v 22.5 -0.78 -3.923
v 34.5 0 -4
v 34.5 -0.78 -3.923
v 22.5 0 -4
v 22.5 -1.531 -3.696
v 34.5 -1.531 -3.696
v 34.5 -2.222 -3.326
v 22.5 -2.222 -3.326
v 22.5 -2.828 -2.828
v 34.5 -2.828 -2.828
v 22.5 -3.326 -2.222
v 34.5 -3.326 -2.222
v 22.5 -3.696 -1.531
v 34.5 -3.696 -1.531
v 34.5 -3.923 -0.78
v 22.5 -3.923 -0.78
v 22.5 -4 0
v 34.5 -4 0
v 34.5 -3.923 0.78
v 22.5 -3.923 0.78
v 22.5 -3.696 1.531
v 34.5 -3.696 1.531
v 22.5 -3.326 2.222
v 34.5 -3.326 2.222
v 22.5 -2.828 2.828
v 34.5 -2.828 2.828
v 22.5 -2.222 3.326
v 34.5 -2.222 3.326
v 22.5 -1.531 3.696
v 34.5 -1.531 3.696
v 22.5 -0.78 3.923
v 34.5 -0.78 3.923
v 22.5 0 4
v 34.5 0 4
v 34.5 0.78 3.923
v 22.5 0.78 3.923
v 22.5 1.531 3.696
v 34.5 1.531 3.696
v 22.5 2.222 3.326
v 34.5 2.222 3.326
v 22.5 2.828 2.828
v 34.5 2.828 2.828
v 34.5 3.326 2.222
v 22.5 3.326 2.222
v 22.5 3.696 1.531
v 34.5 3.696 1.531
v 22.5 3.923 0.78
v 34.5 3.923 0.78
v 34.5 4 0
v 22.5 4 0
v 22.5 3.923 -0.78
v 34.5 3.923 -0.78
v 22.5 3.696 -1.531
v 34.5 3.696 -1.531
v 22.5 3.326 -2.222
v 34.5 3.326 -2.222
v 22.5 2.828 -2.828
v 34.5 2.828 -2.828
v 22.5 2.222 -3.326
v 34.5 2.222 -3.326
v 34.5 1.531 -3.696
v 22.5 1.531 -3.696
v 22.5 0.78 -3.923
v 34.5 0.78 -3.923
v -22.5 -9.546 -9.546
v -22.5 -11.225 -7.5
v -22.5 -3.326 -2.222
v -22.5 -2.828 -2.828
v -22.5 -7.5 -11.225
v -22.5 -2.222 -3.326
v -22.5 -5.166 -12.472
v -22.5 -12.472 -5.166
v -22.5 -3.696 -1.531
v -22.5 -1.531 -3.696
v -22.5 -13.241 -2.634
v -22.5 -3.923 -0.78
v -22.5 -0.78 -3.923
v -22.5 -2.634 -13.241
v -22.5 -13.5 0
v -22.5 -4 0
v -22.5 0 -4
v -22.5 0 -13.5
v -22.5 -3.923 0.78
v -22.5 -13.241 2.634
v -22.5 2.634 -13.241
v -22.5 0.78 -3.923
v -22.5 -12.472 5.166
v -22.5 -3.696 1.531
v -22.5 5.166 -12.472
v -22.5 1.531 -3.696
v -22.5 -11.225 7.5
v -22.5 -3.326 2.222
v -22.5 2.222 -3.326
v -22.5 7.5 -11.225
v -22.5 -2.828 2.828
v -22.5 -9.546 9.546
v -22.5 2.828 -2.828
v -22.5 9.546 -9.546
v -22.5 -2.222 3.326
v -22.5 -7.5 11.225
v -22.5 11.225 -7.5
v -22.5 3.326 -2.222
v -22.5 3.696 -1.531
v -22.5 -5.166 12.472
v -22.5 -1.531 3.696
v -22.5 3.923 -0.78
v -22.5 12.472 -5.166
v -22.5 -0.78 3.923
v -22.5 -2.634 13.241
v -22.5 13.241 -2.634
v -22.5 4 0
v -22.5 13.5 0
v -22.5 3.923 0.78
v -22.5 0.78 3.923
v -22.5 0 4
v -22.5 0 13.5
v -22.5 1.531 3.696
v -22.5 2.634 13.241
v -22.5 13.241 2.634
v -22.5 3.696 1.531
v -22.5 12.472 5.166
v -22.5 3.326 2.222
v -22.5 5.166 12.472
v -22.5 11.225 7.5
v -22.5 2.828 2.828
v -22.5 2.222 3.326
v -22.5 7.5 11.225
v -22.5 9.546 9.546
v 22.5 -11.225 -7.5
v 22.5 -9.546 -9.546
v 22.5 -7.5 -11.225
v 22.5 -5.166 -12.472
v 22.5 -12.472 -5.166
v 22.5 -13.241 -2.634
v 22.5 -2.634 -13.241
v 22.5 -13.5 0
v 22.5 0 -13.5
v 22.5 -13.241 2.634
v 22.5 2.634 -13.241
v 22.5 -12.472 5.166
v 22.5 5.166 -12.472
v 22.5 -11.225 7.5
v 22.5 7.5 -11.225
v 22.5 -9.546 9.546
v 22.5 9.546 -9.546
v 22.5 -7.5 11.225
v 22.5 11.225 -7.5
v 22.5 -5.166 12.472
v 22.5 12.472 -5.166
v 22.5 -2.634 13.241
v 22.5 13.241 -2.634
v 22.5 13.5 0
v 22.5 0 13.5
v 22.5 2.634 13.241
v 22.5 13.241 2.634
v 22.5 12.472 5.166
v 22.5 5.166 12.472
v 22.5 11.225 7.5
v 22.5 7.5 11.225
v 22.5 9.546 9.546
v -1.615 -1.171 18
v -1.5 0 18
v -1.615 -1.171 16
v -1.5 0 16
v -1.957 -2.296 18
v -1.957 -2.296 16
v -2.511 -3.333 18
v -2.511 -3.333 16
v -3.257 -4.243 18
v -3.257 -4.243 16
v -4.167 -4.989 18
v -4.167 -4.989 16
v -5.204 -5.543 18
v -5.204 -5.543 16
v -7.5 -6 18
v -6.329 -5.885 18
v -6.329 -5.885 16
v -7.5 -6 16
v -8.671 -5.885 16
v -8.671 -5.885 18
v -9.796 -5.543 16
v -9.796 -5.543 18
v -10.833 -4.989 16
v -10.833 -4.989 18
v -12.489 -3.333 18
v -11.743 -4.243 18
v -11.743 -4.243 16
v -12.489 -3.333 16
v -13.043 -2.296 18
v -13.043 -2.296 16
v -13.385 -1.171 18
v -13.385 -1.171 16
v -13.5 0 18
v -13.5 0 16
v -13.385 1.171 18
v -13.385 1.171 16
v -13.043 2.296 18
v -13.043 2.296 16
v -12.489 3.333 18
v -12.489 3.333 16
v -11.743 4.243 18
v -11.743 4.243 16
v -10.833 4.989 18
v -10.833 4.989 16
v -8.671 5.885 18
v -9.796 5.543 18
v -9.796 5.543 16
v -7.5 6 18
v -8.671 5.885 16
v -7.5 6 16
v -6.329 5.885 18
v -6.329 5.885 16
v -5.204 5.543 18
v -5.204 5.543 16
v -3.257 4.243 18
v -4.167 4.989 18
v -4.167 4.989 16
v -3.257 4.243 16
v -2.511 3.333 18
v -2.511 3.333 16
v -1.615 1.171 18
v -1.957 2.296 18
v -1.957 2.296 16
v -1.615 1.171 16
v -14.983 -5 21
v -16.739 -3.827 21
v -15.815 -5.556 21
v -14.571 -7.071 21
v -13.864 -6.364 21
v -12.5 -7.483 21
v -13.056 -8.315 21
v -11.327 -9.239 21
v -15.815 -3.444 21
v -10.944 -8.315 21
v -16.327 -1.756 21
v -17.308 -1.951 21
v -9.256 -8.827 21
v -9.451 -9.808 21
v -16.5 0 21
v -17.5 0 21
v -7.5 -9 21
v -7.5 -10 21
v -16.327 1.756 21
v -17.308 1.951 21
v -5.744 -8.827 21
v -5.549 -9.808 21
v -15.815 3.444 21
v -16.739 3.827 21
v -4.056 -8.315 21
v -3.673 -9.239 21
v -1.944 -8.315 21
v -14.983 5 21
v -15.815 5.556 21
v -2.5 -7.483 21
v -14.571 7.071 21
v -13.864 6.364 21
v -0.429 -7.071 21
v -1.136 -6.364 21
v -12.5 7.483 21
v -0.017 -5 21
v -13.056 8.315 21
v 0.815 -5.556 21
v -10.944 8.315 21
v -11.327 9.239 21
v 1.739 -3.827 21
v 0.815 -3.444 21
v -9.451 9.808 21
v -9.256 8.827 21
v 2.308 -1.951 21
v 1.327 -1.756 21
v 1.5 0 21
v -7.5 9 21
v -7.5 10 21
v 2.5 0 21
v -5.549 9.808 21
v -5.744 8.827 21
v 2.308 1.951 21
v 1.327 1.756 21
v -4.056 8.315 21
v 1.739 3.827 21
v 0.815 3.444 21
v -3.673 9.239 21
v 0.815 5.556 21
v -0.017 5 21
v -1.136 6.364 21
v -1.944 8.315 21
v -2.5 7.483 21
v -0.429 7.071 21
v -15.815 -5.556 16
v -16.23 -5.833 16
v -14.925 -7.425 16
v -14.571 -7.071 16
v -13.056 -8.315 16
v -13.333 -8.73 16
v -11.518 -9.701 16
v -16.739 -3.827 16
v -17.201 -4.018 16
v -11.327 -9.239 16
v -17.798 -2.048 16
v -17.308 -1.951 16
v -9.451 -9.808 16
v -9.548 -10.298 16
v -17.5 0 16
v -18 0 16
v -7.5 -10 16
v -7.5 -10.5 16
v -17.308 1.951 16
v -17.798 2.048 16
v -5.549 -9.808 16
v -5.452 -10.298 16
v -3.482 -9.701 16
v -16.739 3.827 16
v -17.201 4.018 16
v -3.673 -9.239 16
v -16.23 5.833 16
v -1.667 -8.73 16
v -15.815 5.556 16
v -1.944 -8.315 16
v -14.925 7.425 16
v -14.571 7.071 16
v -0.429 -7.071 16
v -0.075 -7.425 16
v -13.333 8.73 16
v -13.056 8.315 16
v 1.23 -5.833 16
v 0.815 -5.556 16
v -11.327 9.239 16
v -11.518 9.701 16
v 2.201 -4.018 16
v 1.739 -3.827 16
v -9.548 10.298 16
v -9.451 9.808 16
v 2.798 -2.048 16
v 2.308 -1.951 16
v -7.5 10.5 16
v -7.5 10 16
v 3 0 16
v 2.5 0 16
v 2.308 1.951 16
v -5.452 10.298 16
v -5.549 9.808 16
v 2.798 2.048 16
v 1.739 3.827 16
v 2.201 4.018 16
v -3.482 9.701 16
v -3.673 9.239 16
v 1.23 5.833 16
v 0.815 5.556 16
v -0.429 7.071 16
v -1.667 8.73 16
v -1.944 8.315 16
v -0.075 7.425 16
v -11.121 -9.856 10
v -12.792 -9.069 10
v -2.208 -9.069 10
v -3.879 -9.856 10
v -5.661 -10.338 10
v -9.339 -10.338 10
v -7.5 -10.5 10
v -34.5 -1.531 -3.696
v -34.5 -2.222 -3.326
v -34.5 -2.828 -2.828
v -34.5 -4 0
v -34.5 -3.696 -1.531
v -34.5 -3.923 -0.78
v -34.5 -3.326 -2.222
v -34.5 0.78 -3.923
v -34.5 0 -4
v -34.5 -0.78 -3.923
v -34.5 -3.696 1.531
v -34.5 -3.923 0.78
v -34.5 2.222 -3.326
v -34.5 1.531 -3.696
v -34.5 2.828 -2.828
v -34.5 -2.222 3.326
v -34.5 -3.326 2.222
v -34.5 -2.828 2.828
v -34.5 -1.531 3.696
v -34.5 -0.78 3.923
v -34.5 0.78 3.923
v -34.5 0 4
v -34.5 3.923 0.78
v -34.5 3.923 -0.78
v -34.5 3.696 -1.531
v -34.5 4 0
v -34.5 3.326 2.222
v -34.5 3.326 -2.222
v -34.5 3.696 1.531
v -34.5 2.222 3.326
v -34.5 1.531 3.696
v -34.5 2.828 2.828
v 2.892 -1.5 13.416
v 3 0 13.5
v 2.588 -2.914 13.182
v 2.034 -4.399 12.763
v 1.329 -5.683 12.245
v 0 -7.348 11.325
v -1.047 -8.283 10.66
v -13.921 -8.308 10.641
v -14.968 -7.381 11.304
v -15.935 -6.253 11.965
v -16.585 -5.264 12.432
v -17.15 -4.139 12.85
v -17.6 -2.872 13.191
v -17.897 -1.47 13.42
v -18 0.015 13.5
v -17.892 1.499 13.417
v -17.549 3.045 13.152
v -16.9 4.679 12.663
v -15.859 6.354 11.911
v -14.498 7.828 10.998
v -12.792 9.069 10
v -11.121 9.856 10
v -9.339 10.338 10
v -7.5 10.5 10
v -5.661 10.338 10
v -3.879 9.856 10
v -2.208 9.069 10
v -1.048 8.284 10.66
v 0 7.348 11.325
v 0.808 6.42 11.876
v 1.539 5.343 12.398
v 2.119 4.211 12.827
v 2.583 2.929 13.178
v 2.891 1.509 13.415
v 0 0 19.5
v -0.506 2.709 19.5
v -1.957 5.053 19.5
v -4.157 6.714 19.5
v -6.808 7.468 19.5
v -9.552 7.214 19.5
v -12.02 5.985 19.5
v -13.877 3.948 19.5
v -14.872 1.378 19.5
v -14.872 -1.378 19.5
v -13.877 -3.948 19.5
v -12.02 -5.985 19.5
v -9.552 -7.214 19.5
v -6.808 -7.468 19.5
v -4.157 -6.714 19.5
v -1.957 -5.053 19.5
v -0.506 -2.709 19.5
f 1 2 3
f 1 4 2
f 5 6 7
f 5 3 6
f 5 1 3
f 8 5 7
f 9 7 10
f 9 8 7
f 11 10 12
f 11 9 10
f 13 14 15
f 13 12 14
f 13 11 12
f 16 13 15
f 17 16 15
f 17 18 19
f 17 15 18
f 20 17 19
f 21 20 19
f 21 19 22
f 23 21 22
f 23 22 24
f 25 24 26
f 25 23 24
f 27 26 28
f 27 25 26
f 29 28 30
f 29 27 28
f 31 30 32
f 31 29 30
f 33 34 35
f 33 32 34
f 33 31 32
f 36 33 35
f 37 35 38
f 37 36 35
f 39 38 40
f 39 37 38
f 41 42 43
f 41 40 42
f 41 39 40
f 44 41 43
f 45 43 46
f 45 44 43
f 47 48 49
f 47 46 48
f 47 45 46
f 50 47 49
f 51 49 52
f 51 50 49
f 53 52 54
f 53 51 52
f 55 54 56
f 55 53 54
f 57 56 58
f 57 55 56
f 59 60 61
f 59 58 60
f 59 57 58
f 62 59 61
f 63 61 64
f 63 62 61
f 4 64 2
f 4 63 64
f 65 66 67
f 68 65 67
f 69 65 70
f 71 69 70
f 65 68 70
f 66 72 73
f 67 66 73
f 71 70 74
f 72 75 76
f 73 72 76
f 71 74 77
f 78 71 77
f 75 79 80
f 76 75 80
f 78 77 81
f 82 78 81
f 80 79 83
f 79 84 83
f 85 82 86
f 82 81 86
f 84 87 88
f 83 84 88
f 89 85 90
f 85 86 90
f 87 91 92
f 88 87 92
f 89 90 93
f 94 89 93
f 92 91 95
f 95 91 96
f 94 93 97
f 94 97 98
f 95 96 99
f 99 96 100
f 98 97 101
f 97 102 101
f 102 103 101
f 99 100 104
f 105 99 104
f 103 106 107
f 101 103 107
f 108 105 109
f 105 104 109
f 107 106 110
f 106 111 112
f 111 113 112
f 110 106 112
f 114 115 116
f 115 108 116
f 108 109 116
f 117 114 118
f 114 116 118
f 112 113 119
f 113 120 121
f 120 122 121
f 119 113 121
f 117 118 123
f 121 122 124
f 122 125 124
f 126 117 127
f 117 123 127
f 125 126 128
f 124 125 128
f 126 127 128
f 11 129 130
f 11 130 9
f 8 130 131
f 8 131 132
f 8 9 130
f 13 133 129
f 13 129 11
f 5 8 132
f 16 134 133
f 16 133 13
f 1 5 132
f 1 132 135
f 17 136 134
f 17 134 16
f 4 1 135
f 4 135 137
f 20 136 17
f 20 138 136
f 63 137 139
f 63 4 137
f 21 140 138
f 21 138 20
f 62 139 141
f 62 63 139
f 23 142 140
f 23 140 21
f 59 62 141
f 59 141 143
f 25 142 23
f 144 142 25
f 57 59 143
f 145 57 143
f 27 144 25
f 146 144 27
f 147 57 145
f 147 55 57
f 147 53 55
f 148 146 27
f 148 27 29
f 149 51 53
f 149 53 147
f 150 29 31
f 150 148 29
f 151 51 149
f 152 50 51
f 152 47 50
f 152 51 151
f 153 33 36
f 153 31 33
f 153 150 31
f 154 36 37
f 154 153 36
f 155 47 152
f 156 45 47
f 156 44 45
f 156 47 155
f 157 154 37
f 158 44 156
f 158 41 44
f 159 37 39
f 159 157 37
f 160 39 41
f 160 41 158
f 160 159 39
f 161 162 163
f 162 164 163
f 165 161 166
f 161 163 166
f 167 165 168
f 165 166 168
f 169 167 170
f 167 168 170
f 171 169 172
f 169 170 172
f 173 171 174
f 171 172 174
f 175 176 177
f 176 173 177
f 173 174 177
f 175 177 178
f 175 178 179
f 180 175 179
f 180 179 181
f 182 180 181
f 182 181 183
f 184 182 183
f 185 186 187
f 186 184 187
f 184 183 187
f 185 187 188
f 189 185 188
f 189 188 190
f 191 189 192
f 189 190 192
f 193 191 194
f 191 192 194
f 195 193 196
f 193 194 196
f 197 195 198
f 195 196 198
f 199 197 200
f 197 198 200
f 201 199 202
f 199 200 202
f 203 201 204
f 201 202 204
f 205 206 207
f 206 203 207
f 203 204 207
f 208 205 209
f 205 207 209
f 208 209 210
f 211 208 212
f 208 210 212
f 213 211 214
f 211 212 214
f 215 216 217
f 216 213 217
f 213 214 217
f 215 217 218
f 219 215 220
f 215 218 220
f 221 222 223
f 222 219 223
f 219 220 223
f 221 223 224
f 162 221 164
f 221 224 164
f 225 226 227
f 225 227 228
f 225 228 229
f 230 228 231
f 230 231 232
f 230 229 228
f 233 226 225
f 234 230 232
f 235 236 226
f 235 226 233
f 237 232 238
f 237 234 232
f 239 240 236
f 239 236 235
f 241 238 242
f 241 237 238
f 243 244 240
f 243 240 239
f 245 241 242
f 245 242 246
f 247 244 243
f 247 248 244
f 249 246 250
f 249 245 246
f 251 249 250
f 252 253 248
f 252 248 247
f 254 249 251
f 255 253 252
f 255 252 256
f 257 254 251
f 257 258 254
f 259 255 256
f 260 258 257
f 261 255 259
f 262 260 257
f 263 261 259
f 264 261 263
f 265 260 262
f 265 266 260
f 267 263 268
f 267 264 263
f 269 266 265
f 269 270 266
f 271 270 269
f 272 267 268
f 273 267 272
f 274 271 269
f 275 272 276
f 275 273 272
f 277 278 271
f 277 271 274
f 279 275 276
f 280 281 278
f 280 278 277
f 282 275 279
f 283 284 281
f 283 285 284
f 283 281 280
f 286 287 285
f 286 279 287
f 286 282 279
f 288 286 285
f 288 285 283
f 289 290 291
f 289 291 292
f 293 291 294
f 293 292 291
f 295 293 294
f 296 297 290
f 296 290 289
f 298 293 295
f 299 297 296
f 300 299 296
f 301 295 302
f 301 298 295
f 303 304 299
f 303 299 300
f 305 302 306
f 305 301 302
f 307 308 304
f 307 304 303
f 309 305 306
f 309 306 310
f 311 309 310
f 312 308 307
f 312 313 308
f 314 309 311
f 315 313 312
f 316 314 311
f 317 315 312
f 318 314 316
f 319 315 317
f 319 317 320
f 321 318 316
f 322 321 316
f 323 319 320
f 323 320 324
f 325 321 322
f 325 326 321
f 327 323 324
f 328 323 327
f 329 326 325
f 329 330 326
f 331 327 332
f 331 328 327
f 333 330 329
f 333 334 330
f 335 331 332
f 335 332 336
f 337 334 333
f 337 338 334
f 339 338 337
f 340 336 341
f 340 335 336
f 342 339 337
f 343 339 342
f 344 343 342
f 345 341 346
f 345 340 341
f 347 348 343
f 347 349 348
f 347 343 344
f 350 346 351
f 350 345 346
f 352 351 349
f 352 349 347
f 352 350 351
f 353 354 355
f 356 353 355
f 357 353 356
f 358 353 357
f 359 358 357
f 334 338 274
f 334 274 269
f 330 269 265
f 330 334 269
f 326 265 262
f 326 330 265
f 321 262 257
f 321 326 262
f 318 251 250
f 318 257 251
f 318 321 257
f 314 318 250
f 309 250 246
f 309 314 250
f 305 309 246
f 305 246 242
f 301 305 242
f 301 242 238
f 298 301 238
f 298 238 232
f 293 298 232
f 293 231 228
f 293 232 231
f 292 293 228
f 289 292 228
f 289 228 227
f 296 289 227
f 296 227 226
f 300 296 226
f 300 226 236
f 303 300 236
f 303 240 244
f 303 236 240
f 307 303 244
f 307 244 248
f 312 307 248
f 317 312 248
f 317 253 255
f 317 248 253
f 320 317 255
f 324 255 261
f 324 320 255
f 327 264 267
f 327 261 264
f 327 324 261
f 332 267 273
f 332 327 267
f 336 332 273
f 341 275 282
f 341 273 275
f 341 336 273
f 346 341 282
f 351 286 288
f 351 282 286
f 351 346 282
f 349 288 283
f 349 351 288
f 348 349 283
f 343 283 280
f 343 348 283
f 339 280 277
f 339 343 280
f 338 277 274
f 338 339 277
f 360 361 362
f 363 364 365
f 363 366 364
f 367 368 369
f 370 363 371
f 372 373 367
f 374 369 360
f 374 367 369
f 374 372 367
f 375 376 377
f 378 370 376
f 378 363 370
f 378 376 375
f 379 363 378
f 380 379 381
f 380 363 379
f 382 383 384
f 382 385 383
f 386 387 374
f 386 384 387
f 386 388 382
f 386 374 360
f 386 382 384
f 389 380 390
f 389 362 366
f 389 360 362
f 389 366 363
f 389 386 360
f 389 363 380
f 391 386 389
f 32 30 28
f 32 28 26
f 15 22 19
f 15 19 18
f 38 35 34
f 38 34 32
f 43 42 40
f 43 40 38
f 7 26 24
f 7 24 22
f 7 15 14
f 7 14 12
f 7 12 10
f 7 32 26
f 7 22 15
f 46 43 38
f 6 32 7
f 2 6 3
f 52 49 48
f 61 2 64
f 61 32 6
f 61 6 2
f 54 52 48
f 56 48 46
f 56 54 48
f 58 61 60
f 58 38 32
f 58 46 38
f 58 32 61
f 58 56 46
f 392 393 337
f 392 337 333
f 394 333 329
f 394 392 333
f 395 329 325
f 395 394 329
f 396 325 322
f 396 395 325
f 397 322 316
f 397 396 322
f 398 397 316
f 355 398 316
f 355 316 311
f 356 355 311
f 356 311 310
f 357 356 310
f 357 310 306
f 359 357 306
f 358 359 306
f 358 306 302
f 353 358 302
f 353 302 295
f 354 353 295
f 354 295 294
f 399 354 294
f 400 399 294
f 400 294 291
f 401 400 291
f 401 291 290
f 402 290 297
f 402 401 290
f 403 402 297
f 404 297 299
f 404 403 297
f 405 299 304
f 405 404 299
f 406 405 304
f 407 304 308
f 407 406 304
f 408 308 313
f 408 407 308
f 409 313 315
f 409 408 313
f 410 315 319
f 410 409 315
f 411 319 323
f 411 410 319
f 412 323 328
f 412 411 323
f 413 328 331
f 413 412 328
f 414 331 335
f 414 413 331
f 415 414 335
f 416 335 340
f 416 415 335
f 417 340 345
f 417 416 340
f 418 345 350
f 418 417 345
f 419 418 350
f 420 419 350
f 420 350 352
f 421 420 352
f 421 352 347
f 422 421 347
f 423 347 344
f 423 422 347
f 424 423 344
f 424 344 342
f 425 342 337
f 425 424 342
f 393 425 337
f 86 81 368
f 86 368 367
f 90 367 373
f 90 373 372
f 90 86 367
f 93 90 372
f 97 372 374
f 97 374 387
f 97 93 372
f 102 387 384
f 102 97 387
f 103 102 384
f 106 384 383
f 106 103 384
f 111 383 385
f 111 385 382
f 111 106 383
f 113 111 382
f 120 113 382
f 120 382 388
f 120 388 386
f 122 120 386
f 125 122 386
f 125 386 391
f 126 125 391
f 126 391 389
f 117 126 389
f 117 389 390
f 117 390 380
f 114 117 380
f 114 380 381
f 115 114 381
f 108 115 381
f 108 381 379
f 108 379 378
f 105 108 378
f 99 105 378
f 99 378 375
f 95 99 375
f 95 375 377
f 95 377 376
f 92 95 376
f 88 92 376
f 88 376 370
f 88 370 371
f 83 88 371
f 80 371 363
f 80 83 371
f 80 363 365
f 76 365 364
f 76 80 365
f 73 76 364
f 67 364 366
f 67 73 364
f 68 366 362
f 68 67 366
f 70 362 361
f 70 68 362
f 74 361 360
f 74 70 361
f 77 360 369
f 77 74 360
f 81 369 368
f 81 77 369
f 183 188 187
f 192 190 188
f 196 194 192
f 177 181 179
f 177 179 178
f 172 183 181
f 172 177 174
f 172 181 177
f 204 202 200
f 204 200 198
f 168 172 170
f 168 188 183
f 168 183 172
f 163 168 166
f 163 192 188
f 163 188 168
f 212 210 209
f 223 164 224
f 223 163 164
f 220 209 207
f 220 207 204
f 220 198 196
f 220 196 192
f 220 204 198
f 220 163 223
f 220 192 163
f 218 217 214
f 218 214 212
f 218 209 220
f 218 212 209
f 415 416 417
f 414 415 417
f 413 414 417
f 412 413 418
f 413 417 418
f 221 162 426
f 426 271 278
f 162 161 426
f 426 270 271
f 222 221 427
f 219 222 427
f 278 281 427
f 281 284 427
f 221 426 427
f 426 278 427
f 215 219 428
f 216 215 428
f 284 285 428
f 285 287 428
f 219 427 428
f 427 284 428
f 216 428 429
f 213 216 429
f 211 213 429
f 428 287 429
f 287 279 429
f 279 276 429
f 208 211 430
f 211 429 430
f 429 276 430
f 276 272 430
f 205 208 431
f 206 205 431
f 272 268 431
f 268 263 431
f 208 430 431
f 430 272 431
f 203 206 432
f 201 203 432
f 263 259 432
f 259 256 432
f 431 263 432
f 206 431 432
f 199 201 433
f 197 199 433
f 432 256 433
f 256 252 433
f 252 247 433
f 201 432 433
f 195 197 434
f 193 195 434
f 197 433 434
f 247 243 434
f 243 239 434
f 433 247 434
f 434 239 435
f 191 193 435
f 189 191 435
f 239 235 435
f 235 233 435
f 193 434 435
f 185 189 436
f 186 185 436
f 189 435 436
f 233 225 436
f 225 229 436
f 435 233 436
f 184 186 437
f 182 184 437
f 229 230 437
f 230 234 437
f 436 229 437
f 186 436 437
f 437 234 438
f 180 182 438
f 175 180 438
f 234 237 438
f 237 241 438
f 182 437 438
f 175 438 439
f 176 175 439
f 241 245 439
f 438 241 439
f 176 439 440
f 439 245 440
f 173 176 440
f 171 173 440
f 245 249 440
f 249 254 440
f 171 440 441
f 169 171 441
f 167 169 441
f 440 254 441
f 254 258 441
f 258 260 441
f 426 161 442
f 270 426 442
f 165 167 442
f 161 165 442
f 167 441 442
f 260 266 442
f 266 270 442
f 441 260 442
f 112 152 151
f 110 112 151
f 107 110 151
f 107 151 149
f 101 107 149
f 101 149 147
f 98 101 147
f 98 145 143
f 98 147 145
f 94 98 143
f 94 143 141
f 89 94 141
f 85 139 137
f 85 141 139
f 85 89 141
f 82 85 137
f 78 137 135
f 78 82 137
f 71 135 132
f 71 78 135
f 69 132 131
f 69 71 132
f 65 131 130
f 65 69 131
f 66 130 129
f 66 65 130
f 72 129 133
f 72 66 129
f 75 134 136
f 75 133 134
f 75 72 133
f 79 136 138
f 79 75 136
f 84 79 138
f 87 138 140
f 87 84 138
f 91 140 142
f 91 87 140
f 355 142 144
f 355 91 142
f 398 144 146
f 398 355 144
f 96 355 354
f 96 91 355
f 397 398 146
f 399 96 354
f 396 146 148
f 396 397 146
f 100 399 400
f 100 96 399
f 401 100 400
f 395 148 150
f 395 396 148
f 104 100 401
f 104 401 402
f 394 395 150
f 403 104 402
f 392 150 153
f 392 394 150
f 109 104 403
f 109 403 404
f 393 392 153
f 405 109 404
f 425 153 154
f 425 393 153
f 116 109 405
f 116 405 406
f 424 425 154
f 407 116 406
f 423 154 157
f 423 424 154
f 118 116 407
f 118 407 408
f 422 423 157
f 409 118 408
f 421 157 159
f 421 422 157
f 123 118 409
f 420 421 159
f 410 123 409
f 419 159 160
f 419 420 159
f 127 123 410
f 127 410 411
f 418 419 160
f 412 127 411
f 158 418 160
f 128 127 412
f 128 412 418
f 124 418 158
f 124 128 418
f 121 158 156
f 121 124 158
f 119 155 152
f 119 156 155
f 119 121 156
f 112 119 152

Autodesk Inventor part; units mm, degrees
ref_plane "YZ Plane" through (0, 0, 0) normal (1, 0, 0) x (0, 1, 0)
ref_plane "XZ Plane" through (0, 0, 0) normal (0, 1, 0) x (-1, 0, 0)
sketch "Szkic1" plane through (0, 0, 0) normal (1, 0, 0) x (0, 1, 0)
  circle A0 centre (0, 0) radius 13.5
  dimension "d0" = 27
extrude "Wyciągnięcie proste1" add sketch "Szkic1" along normal mid plane 45
sketch "Szkic2" plane through (22.5, 0, 0) normal (1, 0, 0) x (0, 0, -1)
  circle A0 centre (0, 0) radius 4
  dimension "d3" = 8
extrude "Wyciągnięcie proste2" add sketch "Szkic2" along normal blind 12
mirror "Odbij1" about plane through (0, 0, 0) normal (1, 0, 0) of "Wyciągnięcie proste2"
ref_plane "Płaszczyzna konstrukcyjna1" through (0, 0, 10) normal (0, 0, 1) x (1, 0, 0)
sketch "Szkic3" plane through (0, 0, 10) normal (0, 0, 1) x (1, 0, 0)
  circle A0 centre (-7.5, 0) radius 10.5
  line L0 (-22.5, 13.5) -> (-22.5, -13.5) projected
  point P0 (0, 0)
  dimension "d7" = 21
  dimension "d8" = 15
  dimension "d9" = 13.5
extrude "Wyciągnięcie proste3" add sketch "Szkic3" along normal blind 6
sketch "Szkic4" plane through (-7.5, 0, 16) normal (0, 0, 1) x (1, 0, 0)
  circle A0 centre (0, 0) radius 10
  line L0 (-15, 13.5) -> (-15, -13.5) projected
  circle A1 centre (0, 0) radius 6
  point P0 (7.5, 0)
  dimension "d12" = 20
  dimension "d13" = 15
  dimension "d14" = 13.5
  dimension "d15" = 12
extrude "Wyciągnięcie proste4" add sketch "Szkic4" along normal blind 5
chamfer "Faza1" distance 3 angle 45 1 edges at (-13.5, 0, 21)
properties part number "Kamera" material "Tworzywo sztuczne ABS"
